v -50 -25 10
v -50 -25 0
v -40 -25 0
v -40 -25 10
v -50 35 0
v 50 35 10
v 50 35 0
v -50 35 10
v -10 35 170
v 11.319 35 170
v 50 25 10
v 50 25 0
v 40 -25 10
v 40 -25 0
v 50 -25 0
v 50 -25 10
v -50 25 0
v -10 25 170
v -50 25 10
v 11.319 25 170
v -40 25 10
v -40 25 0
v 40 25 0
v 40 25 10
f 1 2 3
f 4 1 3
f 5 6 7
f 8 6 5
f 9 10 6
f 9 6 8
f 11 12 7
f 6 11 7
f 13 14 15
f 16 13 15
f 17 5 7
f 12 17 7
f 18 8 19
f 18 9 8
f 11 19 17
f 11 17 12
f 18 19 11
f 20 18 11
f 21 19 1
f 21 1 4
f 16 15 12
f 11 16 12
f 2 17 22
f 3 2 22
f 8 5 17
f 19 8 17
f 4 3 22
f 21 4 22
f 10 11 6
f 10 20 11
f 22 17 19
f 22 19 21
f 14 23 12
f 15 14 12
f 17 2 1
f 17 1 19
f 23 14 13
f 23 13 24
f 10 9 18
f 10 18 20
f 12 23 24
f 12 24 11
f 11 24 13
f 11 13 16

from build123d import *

# Parameters (mm, degrees)
F0_W      = 10
F0_H      = 50
F1_DEPTH  = 10
F4_DEPTH  = 10
F4_FACE_W = 100
F4_FACE_H = 10


with BuildPart() as f1:
    # F0 (on Top) → F1 (new body)
    with BuildSketch(Plane.XY):
        with Locations((-45, 0)):
            Rectangle(F0_W, F0_H)
    extrude(amount=F1_DEPTH)


with BuildPart() as f1b:
    # F0 (on Top) → F1, piece 2 (new body)
    with BuildSketch(Plane.XY):
        with Locations((45, 0)):
            Rectangle(F0_W, F0_H)
    extrude(amount=F1_DEPTH)


with BuildPart() as f4:
    # F0 (on Top) → F4 (new body)
    with BuildSketch(Plane.XY):
        Polygon((-40, 25), (40, 25), (50, 25), (50, 35), (-50, 35), (-50, 25), align=None)
    extrude(amount=F4_DEPTH)

    # F4_face (on face) → F5 section 0
    with BuildSketch(Plane(origin=(0, 30, 10), x_dir=(1, 0, 0), z_dir=(0, 0, 1))):
        Rectangle(F4_FACE_W, F4_FACE_H)
    # F3 (on offset) → F5 section 1
    with BuildSketch(Plane.XY.offset(170)):
        Polygon((0, 35), (-10, 35), (-10, 25), (11.3194556907, 25), (11.3194556907, 35), align=None)
    loft()


solid = Compound([f1.part, f1b.part, f4.part])
